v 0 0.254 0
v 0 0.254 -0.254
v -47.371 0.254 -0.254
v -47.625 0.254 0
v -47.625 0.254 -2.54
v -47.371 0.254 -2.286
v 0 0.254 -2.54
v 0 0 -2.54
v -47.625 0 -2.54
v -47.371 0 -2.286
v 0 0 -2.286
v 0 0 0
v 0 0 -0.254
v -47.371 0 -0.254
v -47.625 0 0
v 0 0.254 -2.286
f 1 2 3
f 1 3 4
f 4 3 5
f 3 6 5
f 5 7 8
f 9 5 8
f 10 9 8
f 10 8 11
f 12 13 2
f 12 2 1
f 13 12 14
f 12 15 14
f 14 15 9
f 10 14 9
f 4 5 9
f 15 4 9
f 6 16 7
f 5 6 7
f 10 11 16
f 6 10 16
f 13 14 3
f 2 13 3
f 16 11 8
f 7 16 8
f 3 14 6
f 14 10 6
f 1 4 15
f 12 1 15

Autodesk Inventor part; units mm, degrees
ref_plane "XZ Plane" through (0, 0, 0) normal (0, 1, 0) x (-1, 0, 0)
sketch "Sketch1" plane through (0, 0, 0) normal (0, 1, 0) x (-1, 0, 0)
  line L0 (0, 0) -> (47.625, 0)
  line L1 (47.625, -2.54) -> (0, -2.54)
  line L2 (47.625, -2.54) -> (47.625, 0)
  dimension "d69" = 47.625
  dimension "d70" = 47.625
  dimension "d89" = 2.54
  dimension "d90" = 0
  dimension "d91" = 0
  dimension "d92" = 0
sketch "Sketch2" plane through (0, 0, 0) normal (1, 0, 0) x (0, 1, 0)
  line L0 (0, 0) -> (0.254, 0)
  line L1 (0.254, 0) -> (0.254, -0.254)
  line L2 (0.254, -0.254) -> (0, -0.254)
  line L3 (0, -0.254) -> (0, 0)
  dimension "d98" = 0.254
  dimension "d99" = 0.254
sweep "Sweep1" add profiles "Sketch2" path "Sketch1"
ref_plane "Work Plane1" through (6.35, 0, 0) normal (1, 0, 0) x (0, 1, 0)
ref_plane "Work Plane2" through (0, 0, -6.35) normal (0, 0, 1) x (1, 0, 0)
ref_plane "Work Plane4" through (0, 0, -2.9845) normal (0, 0, 1) x (1, 0, 0)
properties part number "abs_2p27" material "Silver"
